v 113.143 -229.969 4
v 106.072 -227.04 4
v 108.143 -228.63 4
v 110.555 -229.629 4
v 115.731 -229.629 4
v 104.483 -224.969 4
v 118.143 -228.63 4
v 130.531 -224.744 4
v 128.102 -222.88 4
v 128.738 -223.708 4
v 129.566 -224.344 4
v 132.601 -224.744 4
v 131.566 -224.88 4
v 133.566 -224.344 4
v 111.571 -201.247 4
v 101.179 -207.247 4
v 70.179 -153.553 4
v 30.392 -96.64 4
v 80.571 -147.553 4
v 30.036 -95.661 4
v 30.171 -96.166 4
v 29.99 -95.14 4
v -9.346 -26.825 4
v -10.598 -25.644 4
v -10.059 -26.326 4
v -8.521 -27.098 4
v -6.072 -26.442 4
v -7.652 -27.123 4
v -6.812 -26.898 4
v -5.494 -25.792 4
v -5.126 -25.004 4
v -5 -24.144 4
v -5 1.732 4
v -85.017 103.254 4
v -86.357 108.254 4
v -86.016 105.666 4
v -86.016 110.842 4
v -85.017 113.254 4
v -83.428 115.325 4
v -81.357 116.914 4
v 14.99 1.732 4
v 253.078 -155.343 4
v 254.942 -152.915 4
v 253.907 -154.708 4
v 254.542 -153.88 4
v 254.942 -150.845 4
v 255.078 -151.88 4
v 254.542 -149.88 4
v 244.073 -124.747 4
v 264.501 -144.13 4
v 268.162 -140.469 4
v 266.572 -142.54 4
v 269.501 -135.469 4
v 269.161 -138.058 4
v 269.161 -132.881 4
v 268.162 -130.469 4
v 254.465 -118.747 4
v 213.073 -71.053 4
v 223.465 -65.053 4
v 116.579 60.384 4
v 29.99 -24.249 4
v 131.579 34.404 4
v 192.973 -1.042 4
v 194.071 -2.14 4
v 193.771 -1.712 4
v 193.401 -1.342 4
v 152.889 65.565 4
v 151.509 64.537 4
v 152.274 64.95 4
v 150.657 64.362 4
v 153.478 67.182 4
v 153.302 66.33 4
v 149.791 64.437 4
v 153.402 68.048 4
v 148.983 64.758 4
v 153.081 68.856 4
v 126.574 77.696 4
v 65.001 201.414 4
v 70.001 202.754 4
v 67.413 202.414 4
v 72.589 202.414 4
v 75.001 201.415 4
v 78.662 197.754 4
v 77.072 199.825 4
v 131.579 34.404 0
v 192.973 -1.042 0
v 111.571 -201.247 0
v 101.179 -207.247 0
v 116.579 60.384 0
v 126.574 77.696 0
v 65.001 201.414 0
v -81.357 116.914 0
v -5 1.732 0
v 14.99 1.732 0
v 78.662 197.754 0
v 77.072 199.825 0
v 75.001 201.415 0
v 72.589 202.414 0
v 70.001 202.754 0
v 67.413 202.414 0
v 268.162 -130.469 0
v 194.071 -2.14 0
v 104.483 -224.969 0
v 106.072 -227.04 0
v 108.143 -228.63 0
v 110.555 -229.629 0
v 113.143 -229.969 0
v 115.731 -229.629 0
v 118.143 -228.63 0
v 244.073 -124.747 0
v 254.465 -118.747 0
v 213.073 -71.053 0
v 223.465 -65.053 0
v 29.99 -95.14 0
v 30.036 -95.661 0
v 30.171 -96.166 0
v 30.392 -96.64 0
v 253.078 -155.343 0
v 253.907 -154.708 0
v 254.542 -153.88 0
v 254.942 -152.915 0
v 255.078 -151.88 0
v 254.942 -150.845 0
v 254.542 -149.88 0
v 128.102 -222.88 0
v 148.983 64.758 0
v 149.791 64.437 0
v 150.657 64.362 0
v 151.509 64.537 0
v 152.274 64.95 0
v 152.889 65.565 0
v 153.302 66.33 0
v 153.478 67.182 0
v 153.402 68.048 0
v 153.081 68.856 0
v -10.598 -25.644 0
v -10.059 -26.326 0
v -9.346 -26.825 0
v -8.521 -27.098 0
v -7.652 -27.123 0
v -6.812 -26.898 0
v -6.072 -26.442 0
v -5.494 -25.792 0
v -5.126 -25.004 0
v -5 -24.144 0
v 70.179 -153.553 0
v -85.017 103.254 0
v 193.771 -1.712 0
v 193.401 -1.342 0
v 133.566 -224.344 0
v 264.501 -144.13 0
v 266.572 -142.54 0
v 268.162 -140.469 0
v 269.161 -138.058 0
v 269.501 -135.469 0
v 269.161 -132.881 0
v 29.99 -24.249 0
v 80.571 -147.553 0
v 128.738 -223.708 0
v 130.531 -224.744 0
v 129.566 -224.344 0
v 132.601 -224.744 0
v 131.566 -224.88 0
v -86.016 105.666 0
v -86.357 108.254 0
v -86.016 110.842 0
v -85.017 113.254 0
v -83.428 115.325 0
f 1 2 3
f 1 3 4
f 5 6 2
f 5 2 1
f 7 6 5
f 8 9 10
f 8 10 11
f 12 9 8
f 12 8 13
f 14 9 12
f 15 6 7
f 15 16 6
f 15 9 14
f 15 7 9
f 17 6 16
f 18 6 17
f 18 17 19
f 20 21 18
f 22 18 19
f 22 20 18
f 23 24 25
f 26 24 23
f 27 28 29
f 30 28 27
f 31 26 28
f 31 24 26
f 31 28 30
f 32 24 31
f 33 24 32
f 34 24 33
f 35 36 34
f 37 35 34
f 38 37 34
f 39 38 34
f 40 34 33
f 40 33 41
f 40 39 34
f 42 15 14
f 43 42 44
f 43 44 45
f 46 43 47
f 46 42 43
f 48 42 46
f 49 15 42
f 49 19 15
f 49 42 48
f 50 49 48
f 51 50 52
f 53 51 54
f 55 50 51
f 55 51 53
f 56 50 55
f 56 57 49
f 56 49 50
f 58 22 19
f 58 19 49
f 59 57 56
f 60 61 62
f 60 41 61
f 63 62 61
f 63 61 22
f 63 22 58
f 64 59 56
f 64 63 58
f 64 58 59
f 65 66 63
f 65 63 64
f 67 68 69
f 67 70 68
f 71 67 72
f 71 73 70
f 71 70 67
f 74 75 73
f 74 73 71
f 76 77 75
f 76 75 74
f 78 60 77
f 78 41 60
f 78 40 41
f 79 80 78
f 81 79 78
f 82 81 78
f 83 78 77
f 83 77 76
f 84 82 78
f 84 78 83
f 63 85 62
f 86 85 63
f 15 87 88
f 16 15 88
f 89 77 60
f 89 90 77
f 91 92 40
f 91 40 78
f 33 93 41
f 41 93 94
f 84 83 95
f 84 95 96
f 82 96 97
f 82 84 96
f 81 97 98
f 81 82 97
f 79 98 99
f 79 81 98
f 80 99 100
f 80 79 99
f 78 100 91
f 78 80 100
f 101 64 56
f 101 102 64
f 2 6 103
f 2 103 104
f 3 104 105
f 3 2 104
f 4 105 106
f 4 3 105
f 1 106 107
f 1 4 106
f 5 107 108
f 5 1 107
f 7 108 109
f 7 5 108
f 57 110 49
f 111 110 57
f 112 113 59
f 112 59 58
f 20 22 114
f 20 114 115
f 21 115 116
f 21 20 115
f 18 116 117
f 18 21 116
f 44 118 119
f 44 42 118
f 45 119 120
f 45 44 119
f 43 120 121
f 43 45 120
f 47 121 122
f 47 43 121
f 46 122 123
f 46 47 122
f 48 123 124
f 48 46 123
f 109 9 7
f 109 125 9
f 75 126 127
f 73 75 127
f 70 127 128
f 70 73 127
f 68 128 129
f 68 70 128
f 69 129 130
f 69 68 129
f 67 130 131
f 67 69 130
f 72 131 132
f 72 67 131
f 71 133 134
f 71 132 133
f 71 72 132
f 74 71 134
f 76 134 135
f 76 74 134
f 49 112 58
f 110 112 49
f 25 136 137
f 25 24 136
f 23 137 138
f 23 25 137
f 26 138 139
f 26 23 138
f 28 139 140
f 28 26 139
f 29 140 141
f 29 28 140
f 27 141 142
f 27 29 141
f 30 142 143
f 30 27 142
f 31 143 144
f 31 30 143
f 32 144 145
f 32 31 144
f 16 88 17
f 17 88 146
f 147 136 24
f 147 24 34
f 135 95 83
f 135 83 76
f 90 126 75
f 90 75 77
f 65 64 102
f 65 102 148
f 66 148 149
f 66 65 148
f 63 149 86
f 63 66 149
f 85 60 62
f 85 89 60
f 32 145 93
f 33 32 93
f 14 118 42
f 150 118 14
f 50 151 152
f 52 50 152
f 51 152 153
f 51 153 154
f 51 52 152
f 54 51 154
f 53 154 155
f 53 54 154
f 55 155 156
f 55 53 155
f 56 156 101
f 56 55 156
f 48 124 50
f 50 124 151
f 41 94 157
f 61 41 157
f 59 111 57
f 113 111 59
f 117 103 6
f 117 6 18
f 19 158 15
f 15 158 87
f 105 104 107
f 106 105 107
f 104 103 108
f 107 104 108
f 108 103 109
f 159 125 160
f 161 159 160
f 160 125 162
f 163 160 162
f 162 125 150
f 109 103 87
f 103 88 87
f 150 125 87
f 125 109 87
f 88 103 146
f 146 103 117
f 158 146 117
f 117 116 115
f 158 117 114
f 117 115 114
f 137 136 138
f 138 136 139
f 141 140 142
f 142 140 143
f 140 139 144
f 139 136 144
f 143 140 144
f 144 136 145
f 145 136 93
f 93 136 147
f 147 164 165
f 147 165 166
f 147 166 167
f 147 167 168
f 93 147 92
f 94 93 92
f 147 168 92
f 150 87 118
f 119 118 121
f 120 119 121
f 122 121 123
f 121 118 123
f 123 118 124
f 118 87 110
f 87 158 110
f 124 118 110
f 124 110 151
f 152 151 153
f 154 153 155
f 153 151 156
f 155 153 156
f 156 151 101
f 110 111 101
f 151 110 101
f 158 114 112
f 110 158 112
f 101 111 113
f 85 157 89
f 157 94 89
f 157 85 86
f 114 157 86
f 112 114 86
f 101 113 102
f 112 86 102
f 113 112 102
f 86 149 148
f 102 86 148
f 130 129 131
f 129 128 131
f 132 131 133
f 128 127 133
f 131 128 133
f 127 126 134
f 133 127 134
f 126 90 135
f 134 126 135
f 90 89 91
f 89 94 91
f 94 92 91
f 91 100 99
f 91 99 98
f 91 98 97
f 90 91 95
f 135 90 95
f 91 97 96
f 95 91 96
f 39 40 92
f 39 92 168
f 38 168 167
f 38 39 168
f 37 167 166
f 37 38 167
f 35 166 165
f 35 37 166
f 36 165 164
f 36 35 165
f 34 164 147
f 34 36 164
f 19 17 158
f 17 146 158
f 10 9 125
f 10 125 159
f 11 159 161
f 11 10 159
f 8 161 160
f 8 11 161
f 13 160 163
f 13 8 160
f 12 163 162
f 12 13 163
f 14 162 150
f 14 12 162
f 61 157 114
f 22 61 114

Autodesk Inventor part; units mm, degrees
ref_plane "YZ Plane" through (0, 0, 0) normal (1, 0, 0) x (0, 1, 0)
ref_plane "XZ Plane" through (0, 0, 0) normal (0, 1, 0) x (-1, 0, 0)
ref_plane "XY Plane" through (0, 0, 0) normal (0, 0, 1) x (1, 0, 0)
sketch "Sketch1" plane through (0, 0, 0) normal (0, 0, 1) x (1, 0, 0)
  line L0 (-90.0173, 111.9145) -> (73.6615, 206.4145)
  line L1 (73.6615, 206.4145) -> (275.1615, -142.5937)
  line L2 (275.1615, -142.5937) -> (130.1022, -226.3437)
  line L3 (111.4827, -237.0937) -> (109.4827, -233.6296) construction
  line L4 (89.6429, -179.2661) -> (74.6429, -153.2854) construction
  line L5 (74.6429, -153.2854) -> (65.7952, -137.9607) construction
  line L6 (69.2593, -135.9607) -> (65.7952, -137.9607) construction
  line L7 (69.2593, -135.9607) -> (78.1071, -151.2854) construction
  line L8 (78.1071, -151.2854) -> (93.1071, -177.2661) construction
  line L9 (93.1071, -177.2661) -> (89.6429, -179.2661) construction
  line L10 (74.6429, -153.2854) -> (78.1071, -151.2854) construction
  line L11 (-4, -30) -> (-4, 0) construction
  line L12 (-4, 0) -> (-4, 17.6954) construction
  line L13 (0, 17.6954) -> (-4, 17.6954) construction
  line L14 (0, 17.6954) -> (0, 0) construction
  line L15 (0, 0) -> (0, -30) construction
  line L16 (0, -30) -> (-4, -30) construction
  line L17 (-4, 0) -> (0, 0) construction
  line L18 (151.5544, 57.5) -> (125.5737, 72.5) construction
  line L19 (125.5737, 72.5) -> (110.249, 81.3477) construction
  line L20 (112.249, 84.8118) -> (110.249, 81.3477) construction
  line L21 (112.249, 84.8118) -> (127.5737, 75.9641) construction
  line L22 (127.5737, 75.9641) -> (153.5544, 60.9641) construction
  line L23 (153.5544, 60.9641) -> (151.5544, 57.5) construction
  line L24 (125.5737, 72.5) -> (127.5737, 75.9641) construction
  line L25 (232.5371, -96.7661) -> (217.5371, -70.7854) construction
  line L26 (217.5371, -70.7854) -> (208.6894, -55.4607) construction
  line L27 (212.1535, -53.4607) -> (208.6894, -55.4607) construction
  line L28 (212.1535, -53.4607) -> (221.0012, -68.7854) construction
  line L29 (221.0012, -68.7854) -> (236.0012, -94.7661) construction
  line L30 (236.0012, -94.7661) -> (232.5371, -96.7661) construction
  line L31 (217.5371, -70.7854) -> (221.0012, -68.7854) construction
  line L32 (142.8942, 62.5) -> (129.9038, 70) construction
  line L33 (129.9038, 70) -> (187.774, -30.2341) construction
  line L34 (187.774, -30.2341) -> (57.8702, -105.2341) construction
  line L35 (57.8702, -105.2341) -> (0, -5) construction
  line L36 (0, -5) -> (0, -20) construction
  line L37 (0, -20) -> (-4, -20) construction
  line L38 (-4, -20) -> (-4, 1.9282) construction
  line L39 (-4, 1.9282) -> (-65.6298, 108.6742) construction
  line L40 (-65.6298, 108.6742) -> (64.274, 183.6742) construction
  line L41 (64.274, 183.6742) -> (125.9038, 76.9282) construction
  line L42 (125.9038, 76.9282) -> (144.8942, 65.9641) construction
  line L43 (144.8942, 65.9641) -> (142.8942, 62.5) construction
  circle A0 centre (93.125, -181.2972) radius 1.5 construction
  circle A1 centre (-2, -33.5) radius 1.5 construction
  circle A2 centre (236.0192, -98.7972) radius 1.5 construction
  line L44 (57.1429, -122.9745) -> (60.6071, -120.9745) construction
  line L45 (60.6071, -120.9745) -> (88.1071, -168.6059) construction
  line L46 (88.1071, -168.6059) -> (84.6429, -170.6059) construction
  line L47 (84.6429, -170.6059) -> (57.1429, -122.9745) construction
  line L48 (200.0371, -40.4745) -> (203.5012, -38.4745) construction
  line L49 (203.5012, -38.4745) -> (231.0012, -86.1059) construction
  line L50 (231.0012, -86.1059) -> (227.5371, -88.1059) construction
  line L51 (227.5371, -88.1059) -> (200.0371, -40.4745) construction
  circle A3 centre (155.5855, 57.4821) radius 1.5 construction
  line L52 (240.274, -121.1668) -> (261.274, -157.5398) construction
  line L53 (272.0993, -151.2898) -> (261.274, -157.5398) construction
  line L54 (268.0993, -144.3616) -> (272.0993, -151.2898) construction
  line L55 (268.0993, -144.3616) -> (299.7092, -126.1116) construction
  line L56 (299.7092, -126.1116) -> (281.7092, -94.9347) construction
  line L57 (281.7092, -94.9347) -> (277.5523, -97.3347) construction
  line L58 (277.5523, -97.3347) -> (278.1523, -98.374) construction
  line L59 (278.1523, -98.374) -> (276.0739, -99.574) construction
  line L60 (276.0739, -99.574) -> (275.4739, -98.5347) construction
  line L61 (275.4739, -98.5347) -> (271.3169, -100.9347) construction
  line L62 (271.3169, -100.9347) -> (269.8169, -98.3367) construction
  line L63 (269.8169, -98.3367) -> (273.9739, -95.9367) construction
  line L64 (273.9739, -95.9367) -> (273.3739, -94.8974) construction
  line L65 (273.3739, -94.8974) -> (275.4523, -93.6974) construction
  line L66 (275.4523, -93.6974) -> (276.0523, -94.7367) construction
  line L67 (276.0523, -94.7367) -> (280.2092, -92.3367) construction
  line L68 (280.2092, -92.3367) -> (262.2092, -61.1597) construction
  line L69 (262.2092, -61.1597) -> (265.6733, -59.1597) construction
  line L70 (265.6733, -59.1597) -> (228.1733, 5.7922) construction
  line L71 (228.1733, 5.7922) -> (224.7092, 3.7922) construction
  line L72 (224.7092, 3.7922) -> (206.7092, 34.9691) construction
  line L73 (206.7092, 34.9691) -> (202.5523, 32.5691) construction
  line L74 (202.5523, 32.5691) -> (203.1523, 31.5299) construction
  line L75 (203.1523, 31.5299) -> (201.0739, 30.3299) construction
  line L76 (201.0739, 30.3299) -> (200.4739, 31.3691) construction
  line L77 (200.4739, 31.3691) -> (196.3169, 28.9691) construction
  line L78 (196.3169, 28.9691) -> (194.8169, 31.5672) construction
  line L79 (194.8169, 31.5672) -> (198.9739, 33.9672) construction
  line L80 (198.9739, 33.9672) -> (198.3739, 35.0064) construction
  line L81 (198.3739, 35.0064) -> (200.4523, 36.2064) construction
  line L82 (200.4523, 36.2064) -> (201.0523, 35.1672) construction
  line L83 (201.0523, 35.1672) -> (205.2092, 37.5672) construction
  line L84 (205.2092, 37.5672) -> (187.2092, 68.7441) construction
  line L85 (187.2092, 68.7441) -> (190.6733, 70.7441) construction
  line L86 (190.6733, 70.7441) -> (153.1733, 135.696) construction
  line L87 (153.1733, 135.696) -> (149.7092, 133.696) construction
  line L88 (149.7092, 133.696) -> (131.7092, 164.8729) construction
  line L89 (131.7092, 164.8729) -> (127.5523, 162.4729) construction
  line L90 (127.5523, 162.4729) -> (128.1523, 161.4337) construction
  line L91 (128.1523, 161.4337) -> (126.0739, 160.2337) construction
  line L92 (126.0739, 160.2337) -> (125.4739, 161.2729) construction
  line L93 (125.4739, 161.2729) -> (121.3169, 158.8729) construction
  line L94 (121.3169, 158.8729) -> (119.8169, 161.471) construction
  line L95 (119.8169, 161.471) -> (123.9739, 163.871) construction
  line L96 (123.9739, 163.871) -> (123.3739, 164.9102) construction
  line L97 (123.3739, 164.9102) -> (125.4523, 166.1102) construction
  line L98 (125.4523, 166.1102) -> (126.0523, 165.071) construction
  line L99 (126.0523, 165.071) -> (130.2092, 167.471) construction
  line L100 (130.2092, 167.471) -> (112.2092, 198.6479) construction
  line L101 (112.2092, 198.6479) -> (115.6733, 200.6479) construction
  line L102 (115.6733, 200.6479) -> (78.1733, 265.5998) construction
  line L103 (78.1733, 265.5998) -> (57.3887, 253.5998) construction
  line L104 (57.3887, 253.5998) -> (94.8887, 188.6479) construction
  line L105 (91.4246, 186.6479) -> (94.8887, 188.6479) construction
  line L106 (53.9246, 251.5998) -> (91.4246, 186.6479) construction
  line L107 (43.0993, 245.3498) -> (53.9246, 251.5998) construction
  line L108 (41.0993, 248.8139) -> (43.0993, 245.3498) construction
  line L109 (10.7884, 231.3139) -> (41.0993, 248.8139) construction
  line L110 (12.7884, 227.8498) -> (10.7884, 231.3139) construction
  line L111 (-1.068, 219.8498) -> (12.7884, 227.8498) construction
  line L112 (1.332, 215.6929) -> (-1.068, 219.8498) construction
  line L113 (2.3713, 216.2929) -> (1.332, 215.6929) construction
  line L114 (3.5713, 214.2144) -> (2.3713, 216.2929) construction
  line L115 (2.532, 213.6144) -> (3.5713, 214.2144) construction
  line L116 (4.932, 209.4575) -> (2.532, 213.6144) construction
  line L117 (2.3339, 207.9575) -> (4.932, 209.4575) construction
  line L118 (-0.0661, 212.1144) -> (2.3339, 207.9575) construction
  line L119 (-1.1053, 211.5144) -> (-0.0661, 212.1144) construction
  line L120 (-2.3053, 213.5929) -> (-1.1053, 211.5144) construction
  line L121 (-1.2661, 214.1929) -> (-2.3053, 213.5929) construction
  line L122 (-3.6661, 218.3498) -> (-1.2661, 214.1929) construction
  line L123 (-17.5225, 210.3498) -> (-3.6661, 218.3498) construction
  line L124 (-19.5225, 213.8139) -> (-17.5225, 210.3498) construction
  line L125 (-49.8333, 196.3139) -> (-19.5225, 213.8139) construction
  line L126 (-47.8333, 192.8498) -> (-49.8333, 196.3139) construction
  line L127 (-61.6898, 184.8498) -> (-47.8333, 192.8498) construction
  line L128 (-59.2898, 180.6929) -> (-61.6898, 184.8498) construction
  line L129 (-58.2505, 181.2929) -> (-59.2898, 180.6929) construction
  line L130 (-57.0505, 179.2144) -> (-58.2505, 181.2929) construction
  line L131 (-58.0898, 178.6144) -> (-57.0505, 179.2144) construction
  line L132 (-55.6898, 174.4575) -> (-58.0898, 178.6144) construction
  line L133 (-58.2878, 172.9575) -> (-55.6898, 174.4575) construction
  line L134 (-60.6878, 177.1144) -> (-58.2878, 172.9575) construction
  line L135 (-61.7271, 176.5144) -> (-60.6878, 177.1144) construction
  line L136 (-62.9271, 178.5929) -> (-61.7271, 176.5144) construction
  line L137 (-61.8878, 179.1929) -> (-62.9271, 178.5929) construction
  line L138 (-64.2878, 183.3498) -> (-61.8878, 179.1929) construction
  line L139 (-78.1442, 175.3498) -> (-64.2878, 183.3498) construction
  line L140 (-80.1442, 178.8139) -> (-78.1442, 175.3498) construction
  line L141 (-110.4551, 161.3139) -> (-80.1442, 178.8139) construction
  line L142 (-108.4551, 157.8498) -> (-110.4551, 161.3139) construction
  line L143 (-122.7445, 149.5998) -> (-108.4551, 157.8498) construction
  line L144 (-85.2445, 84.6479) -> (-122.7445, 149.5998) construction
  line L145 (-81.7804, 86.6479) -> (-85.2445, 84.6479) construction
  line L146 (-63.7804, 55.471) -> (-81.7804, 86.6479) construction
  line L147 (-63.7804, 55.471) -> (-59.6235, 57.871) construction
  line L148 (-59.6235, 57.871) -> (-60.2235, 58.9102) construction
  line L149 (-60.2235, 58.9102) -> (-58.1451, 60.1102) construction
  line L150 (-58.1451, 60.1102) -> (-57.5451, 59.071) construction
  line L151 (-57.5451, 59.071) -> (-53.3881, 61.471) construction
  line L152 (-53.3881, 61.471) -> (-51.8881, 58.8729) construction
  line L153 (-51.8881, 58.8729) -> (-56.0451, 56.4729) construction
  line L154 (-56.0451, 56.4729) -> (-55.4451, 55.4337) construction
  line L155 (-55.4451, 55.4337) -> (-57.5235, 54.2337) construction
  line L156 (-57.5235, 54.2337) -> (-58.1235, 55.2729) construction
  line L157 (-58.1235, 55.2729) -> (-62.2804, 52.8729) construction
  line L158 (-44.2804, 21.696) -> (-62.2804, 52.8729) construction
  line L159 (-47.7445, 19.696) -> (-44.2804, 21.696) construction
  line L160 (-10.2445, -45.2559) -> (-47.7445, 19.696) construction
  line L161 (-6.7804, -43.2559) -> (-10.2445, -45.2559) construction
  line L162 (11.2196, -74.4328) -> (-6.7804, -43.2559) construction
  line L163 (11.2196, -74.4328) -> (15.3765, -72.0328) construction
  line L164 (15.3765, -72.0328) -> (14.7765, -70.9936) construction
  line L165 (14.7765, -70.9936) -> (16.8549, -69.7936) construction
  line L166 (16.8549, -69.7936) -> (17.4549, -70.8328) construction
  line L167 (17.4549, -70.8328) -> (21.6119, -68.4328) construction
  line L168 (21.6119, -68.4328) -> (23.1119, -71.0309) construction
  line L169 (23.1119, -71.0309) -> (18.9549, -73.4309) construction
  line L170 (18.9549, -73.4309) -> (19.5549, -74.4701) construction
  line L171 (19.5549, -74.4701) -> (17.4765, -75.6701) construction
  line L172 (17.4765, -75.6701) -> (16.8765, -74.6309) construction
  line L173 (16.8765, -74.6309) -> (12.7196, -77.0309) construction
  line L174 (30.7196, -108.2078) -> (12.7196, -77.0309) construction
  line L175 (27.2555, -110.2078) -> (30.7196, -108.2078) construction
  line L176 (64.7555, -175.1597) -> (27.2555, -110.2078) construction
  line L177 (68.2196, -173.1597) -> (64.7555, -175.1597) construction
  line L178 (86.2196, -204.3367) -> (68.2196, -173.1597) construction
  line L179 (86.2196, -204.3367) -> (90.3765, -201.9367) construction
  line L180 (90.3765, -201.9367) -> (89.7765, -200.8974) construction
  line L181 (89.7765, -200.8974) -> (91.8549, -199.6974) construction
  line L182 (91.8549, -199.6974) -> (92.4549, -200.7367) construction
  line L183 (92.4549, -200.7367) -> (96.6119, -198.3367) construction
  line L184 (96.6119, -198.3367) -> (98.1119, -200.9347) construction
  line L185 (98.1119, -200.9347) -> (93.9549, -203.3347) construction
  line L186 (93.9549, -203.3347) -> (94.5549, -204.374) construction
  line L187 (94.5549, -204.374) -> (92.4765, -205.574) construction
  line L188 (92.4765, -205.574) -> (91.8765, -204.5347) construction
  line L189 (91.8765, -204.5347) -> (87.7196, -206.9347) construction
  line L190 (105.7196, -238.1116) -> (87.7196, -206.9347) construction
  line L191 (116.5449, -231.8616) -> (105.7196, -238.1116) construction
  line L192 (120.5449, -238.7898) -> (116.5449, -231.8616) construction
  line L193 (131.3702, -232.5398) -> (120.5449, -238.7898) construction
  line L194 (131.3702, -232.5398) -> (110.3702, -196.1668) construction
  line L195 (110.3702, -196.1668) -> (240.274, -121.1668) construction
  line L196 (241.4246, -73.1597) -> (244.8887, -71.1597) construction
  line L197 (203.9246, -8.2078) -> (241.4246, -73.1597) construction
  line L198 (207.3887, -6.2078) -> (203.9246, -8.2078) construction
  line L199 (207.3887, -6.2078) -> (244.8887, -71.1597) construction
  line L200 (166.4246, 56.7441) -> (169.8887, 58.7441) construction
  line L201 (128.9246, 121.696) -> (166.4246, 56.7441) construction
  line L202 (132.3887, 123.696) -> (128.9246, 121.696) construction
  line L203 (132.3887, 123.696) -> (169.8887, 58.7441) construction
  circle A4 centre (245.1913, -27.6838) radius 1.5 construction
  circle A5 centre (170.1913, 102.22) radius 1.5 construction
  circle A6 centre (95.1913, 232.1238) radius 1.5 construction
  circle A7 centre (-40.4936, 160.137) radius 1.5 construction
  circle A8 centre (7.1378, 187.637) radius 1.5 construction
  circle A9 centre (162.6378, -81.6969) radius 1.5 construction
  circle A10 centre (115.0064, -109.1969) radius 1.5 construction
  circle A11 centre (148.5064, -167.2206) radius 1.5 construction
  circle A12 centre (196.1378, -139.7206) radius 1.5 construction
  line L204 (107.3461, -115.929) -> (77.0353, -133.429) construction
  line L205 (77.0353, -133.429) -> (75.0353, -129.9649) construction
  line L206 (75.0353, -129.9649) -> (105.3461, -112.4649) construction
  line L207 (105.3461, -112.4649) -> (107.3461, -115.929) construction
  line L208 (45.1089, 211.869) -> (47.1089, 208.4049) construction
  line L209 (47.1089, 208.4049) -> (16.798, 190.9049) construction
  line L210 (16.798, 190.9049) -> (14.798, 194.369) construction
  line L211 (14.798, 194.369) -> (45.1089, 211.869) construction
  line L212 (-32.8333, 166.869) -> (-2.5225, 184.369) construction
  line L213 (-2.5225, 184.369) -> (-0.5225, 180.9049) construction
  line L214 (-0.5225, 180.9049) -> (-30.8333, 163.4049) construction
  line L215 (-30.8333, 163.4049) -> (-32.8333, 166.869) construction
  line L216 (140.8461, -173.9527) -> (110.5353, -191.4527) construction
  line L217 (110.5353, -191.4527) -> (108.5353, -187.9886) construction
  line L218 (108.5353, -187.9886) -> (138.8461, -170.4886) construction
  line L219 (138.8461, -170.4886) -> (140.8461, -173.9527) construction
  line L220 (154.9775, -88.429) -> (124.6667, -105.929) construction
  line L221 (124.6667, -105.929) -> (122.6667, -102.4649) construction
  line L222 (122.6667, -102.4649) -> (152.9775, -84.9649) construction
  line L223 (152.9775, -84.9649) -> (154.9775, -88.429) construction
  line L224 (236.1089, -118.9527) -> (205.798, -136.4527) construction
  line L225 (205.798, -136.4527) -> (203.798, -132.9886) construction
  line L226 (203.798, -132.9886) -> (234.1089, -115.4886) construction
  line L227 (234.1089, -115.4886) -> (236.1089, -118.9527) construction
  line L228 (-48.1539, 153.4049) -> (-78.4647, 135.9049) construction
  line L229 (-78.4647, 135.9049) -> (-80.4647, 139.369) construction
  line L230 (-80.4647, 139.369) -> (-50.1539, 156.869) construction
  line L231 (-50.1539, 156.869) -> (-48.1539, 153.4049) construction
  line L232 (186.4775, -142.9886) -> (188.4775, -146.4527) construction
  line L233 (188.4775, -146.4527) -> (158.1667, -163.9527) construction
  line L234 (158.1667, -163.9527) -> (156.1667, -160.4886) construction
  line L235 (156.1667, -160.4886) -> (186.4775, -142.9886) construction
  line L236 (200.6089, -57.4649) -> (202.6089, -60.929) construction
  line L237 (202.6089, -60.929) -> (172.298, -78.429) construction
  line L238 (172.298, -78.429) -> (170.298, -74.9649) construction
  line L239 (170.298, -74.9649) -> (200.6089, -57.4649) construction
  circle A13 centre (-27.2625, -11.78) radius 1.5 construction
  circle A14 centre (47.7375, -141.6838) radius 1.5 construction
  circle A15 centre (186.9067, 25.2681) radius 1.5 construction
  circle A16 centre (111.9067, 155.1719) radius 1.5 construction
  circle A17 centre (261.9067, -104.6357) radius 1.5 construction
  circle A18 centre (-102.2625, 118.1238) radius 1.5 construction
  line L240 (116.5449, -231.8616) -> (268.0993, -144.3616) construction
  line L241 (118.5449, -235.3257) -> (116.5449, -231.8616) construction
  line L242 (118.5449, -235.3257) -> (270.0993, -147.8257) construction
  line L243 (270.0993, -147.8257) -> (268.0993, -144.3616) construction
  line L244 (284.3887, -139.5757) -> (104.2555, -243.5757) construction
  line L245 (104.2555, -243.5757) -> (106.2555, -247.0398) construction
  line L246 (286.3887, -143.0398) -> (106.2555, -247.0398) construction
  line L247 (284.3887, -139.5757) -> (286.3887, -143.0398) construction
  line L248 (-5, 1.7321) -> (29.99, 1.7321) construction
  line L249 (29.99, 1.7321) -> (29.99, -35.3397) construction
  line L250 (29.99, -35.3397) -> (-5, -35.3397) construction
  line L251 (-5, -35.3397) -> (-5, 1.7321)
  line L252 (14.99, 1.7321) -> (29.99, -24.2487)
  line L253 (29.99, -24.2487) -> (29.99, -95.9441)
  line L254 (-5, 1.7321) -> (14.99, 1.7321)
  line L255 (70.1788, -153.5533) -> (80.5712, -147.5533)
  line L256 (80.5712, -147.5533) -> (111.5712, -201.2469)
  line L257 (111.5712, -201.2469) -> (101.1788, -207.2469)
  line L258 (101.1788, -207.2469) -> (70.1788, -153.5533)
  line L259 (111.4827, -237.0937) -> (130.1022, -226.3437) construction
  line L260 (130.1022, -226.3437) -> (128.1022, -222.8796)
  line L261 (128.1022, -222.8796) -> (109.4827, -233.6296)
  line L262 (109.4827, -233.6296) -> (111.4827, -237.0937) construction
  line L263 (109.4827, -233.6296) -> (-90.0173, 111.9145)
  line L264 (130.1022, -226.3437) -> (111.4827, -237.0937) construction
  line L265 (-0.6779, 146.1742) -> (194.3221, -191.5757) construction
  line L266 (158.6788, 59.1603) -> (126.5737, 77.6962)
  line L267 (116.5787, 60.3843) -> (131.5787, 34.4036)
  line L268 (131.5787, 34.4036) -> (193.6688, -1.4441)
  line L269 (126.5737, 77.6962) -> (116.5787, 60.3843)
  line L270 (223.4653, -65.0533) -> (213.073, -71.0533)
  line L271 (213.073, -71.0533) -> (244.073, -124.7469)
  line L272 (244.073, -124.7469) -> (254.4653, -118.7469)
  line L273 (254.4653, -118.7469) -> (223.4653, -65.0533)
  line L274 (256.542, -153.3437) -> (254.542, -149.8796)
  line L275 (254.542, -149.8796) -> (273.1615, -139.1296)
  line L276 (-4, 0) -> (-5, 1.7321) construction
  line L277 (-5, 1.7321) -> (-5, 1.7321) construction
  point P0 (75.375, -150.5533)
  point P1 (193.6688, -1.4441)
  dimension "d0" = 2
  dimension "d1" = 10
  dimension "d2" = 10
  dimension "d3" = 1
  dimension "d5" = 5
  dimension "d7" = 30
  dimension "d8" = 4
  dimension "d9" = 4
  dimension "d12" = 30
  dimension "d13" = 2
  dimension "d14" = 2
  dimension "d17" = 2
  dimension "d18" = 15
  dimension "d19" = 2
extrude "Extrusion1" add sketch "Sketch1" along normal blind 4 contours L0 L1 L266 L269 L267 L268 L275 L274 L2 L260 L261 L263 L253 L252 L254 L251
fillet "Fillet1" radius 3 1 edges at (-5, -35.3397, 2)
fillet "Fillet2" radius 3 3 edges at (29.99, -95.9441, 2) (193.6688, -1.4441, 2) (158.6788, 59.1603, 2)
fillet "Fillet3" radius 10 4 edges at (273.1615, -139.1296, 2) (73.6615, 206.4145, 2) (-90.0173, 111.9145, 2) (109.4827, -233.6296, 2)
fillet "Fillet4" radius 4 2 edges at (130.1022, -226.3437, 2) (256.542, -153.3437, 2)
properties part number "Cover_Back" material "MDF Medium Density Fiberboard"
